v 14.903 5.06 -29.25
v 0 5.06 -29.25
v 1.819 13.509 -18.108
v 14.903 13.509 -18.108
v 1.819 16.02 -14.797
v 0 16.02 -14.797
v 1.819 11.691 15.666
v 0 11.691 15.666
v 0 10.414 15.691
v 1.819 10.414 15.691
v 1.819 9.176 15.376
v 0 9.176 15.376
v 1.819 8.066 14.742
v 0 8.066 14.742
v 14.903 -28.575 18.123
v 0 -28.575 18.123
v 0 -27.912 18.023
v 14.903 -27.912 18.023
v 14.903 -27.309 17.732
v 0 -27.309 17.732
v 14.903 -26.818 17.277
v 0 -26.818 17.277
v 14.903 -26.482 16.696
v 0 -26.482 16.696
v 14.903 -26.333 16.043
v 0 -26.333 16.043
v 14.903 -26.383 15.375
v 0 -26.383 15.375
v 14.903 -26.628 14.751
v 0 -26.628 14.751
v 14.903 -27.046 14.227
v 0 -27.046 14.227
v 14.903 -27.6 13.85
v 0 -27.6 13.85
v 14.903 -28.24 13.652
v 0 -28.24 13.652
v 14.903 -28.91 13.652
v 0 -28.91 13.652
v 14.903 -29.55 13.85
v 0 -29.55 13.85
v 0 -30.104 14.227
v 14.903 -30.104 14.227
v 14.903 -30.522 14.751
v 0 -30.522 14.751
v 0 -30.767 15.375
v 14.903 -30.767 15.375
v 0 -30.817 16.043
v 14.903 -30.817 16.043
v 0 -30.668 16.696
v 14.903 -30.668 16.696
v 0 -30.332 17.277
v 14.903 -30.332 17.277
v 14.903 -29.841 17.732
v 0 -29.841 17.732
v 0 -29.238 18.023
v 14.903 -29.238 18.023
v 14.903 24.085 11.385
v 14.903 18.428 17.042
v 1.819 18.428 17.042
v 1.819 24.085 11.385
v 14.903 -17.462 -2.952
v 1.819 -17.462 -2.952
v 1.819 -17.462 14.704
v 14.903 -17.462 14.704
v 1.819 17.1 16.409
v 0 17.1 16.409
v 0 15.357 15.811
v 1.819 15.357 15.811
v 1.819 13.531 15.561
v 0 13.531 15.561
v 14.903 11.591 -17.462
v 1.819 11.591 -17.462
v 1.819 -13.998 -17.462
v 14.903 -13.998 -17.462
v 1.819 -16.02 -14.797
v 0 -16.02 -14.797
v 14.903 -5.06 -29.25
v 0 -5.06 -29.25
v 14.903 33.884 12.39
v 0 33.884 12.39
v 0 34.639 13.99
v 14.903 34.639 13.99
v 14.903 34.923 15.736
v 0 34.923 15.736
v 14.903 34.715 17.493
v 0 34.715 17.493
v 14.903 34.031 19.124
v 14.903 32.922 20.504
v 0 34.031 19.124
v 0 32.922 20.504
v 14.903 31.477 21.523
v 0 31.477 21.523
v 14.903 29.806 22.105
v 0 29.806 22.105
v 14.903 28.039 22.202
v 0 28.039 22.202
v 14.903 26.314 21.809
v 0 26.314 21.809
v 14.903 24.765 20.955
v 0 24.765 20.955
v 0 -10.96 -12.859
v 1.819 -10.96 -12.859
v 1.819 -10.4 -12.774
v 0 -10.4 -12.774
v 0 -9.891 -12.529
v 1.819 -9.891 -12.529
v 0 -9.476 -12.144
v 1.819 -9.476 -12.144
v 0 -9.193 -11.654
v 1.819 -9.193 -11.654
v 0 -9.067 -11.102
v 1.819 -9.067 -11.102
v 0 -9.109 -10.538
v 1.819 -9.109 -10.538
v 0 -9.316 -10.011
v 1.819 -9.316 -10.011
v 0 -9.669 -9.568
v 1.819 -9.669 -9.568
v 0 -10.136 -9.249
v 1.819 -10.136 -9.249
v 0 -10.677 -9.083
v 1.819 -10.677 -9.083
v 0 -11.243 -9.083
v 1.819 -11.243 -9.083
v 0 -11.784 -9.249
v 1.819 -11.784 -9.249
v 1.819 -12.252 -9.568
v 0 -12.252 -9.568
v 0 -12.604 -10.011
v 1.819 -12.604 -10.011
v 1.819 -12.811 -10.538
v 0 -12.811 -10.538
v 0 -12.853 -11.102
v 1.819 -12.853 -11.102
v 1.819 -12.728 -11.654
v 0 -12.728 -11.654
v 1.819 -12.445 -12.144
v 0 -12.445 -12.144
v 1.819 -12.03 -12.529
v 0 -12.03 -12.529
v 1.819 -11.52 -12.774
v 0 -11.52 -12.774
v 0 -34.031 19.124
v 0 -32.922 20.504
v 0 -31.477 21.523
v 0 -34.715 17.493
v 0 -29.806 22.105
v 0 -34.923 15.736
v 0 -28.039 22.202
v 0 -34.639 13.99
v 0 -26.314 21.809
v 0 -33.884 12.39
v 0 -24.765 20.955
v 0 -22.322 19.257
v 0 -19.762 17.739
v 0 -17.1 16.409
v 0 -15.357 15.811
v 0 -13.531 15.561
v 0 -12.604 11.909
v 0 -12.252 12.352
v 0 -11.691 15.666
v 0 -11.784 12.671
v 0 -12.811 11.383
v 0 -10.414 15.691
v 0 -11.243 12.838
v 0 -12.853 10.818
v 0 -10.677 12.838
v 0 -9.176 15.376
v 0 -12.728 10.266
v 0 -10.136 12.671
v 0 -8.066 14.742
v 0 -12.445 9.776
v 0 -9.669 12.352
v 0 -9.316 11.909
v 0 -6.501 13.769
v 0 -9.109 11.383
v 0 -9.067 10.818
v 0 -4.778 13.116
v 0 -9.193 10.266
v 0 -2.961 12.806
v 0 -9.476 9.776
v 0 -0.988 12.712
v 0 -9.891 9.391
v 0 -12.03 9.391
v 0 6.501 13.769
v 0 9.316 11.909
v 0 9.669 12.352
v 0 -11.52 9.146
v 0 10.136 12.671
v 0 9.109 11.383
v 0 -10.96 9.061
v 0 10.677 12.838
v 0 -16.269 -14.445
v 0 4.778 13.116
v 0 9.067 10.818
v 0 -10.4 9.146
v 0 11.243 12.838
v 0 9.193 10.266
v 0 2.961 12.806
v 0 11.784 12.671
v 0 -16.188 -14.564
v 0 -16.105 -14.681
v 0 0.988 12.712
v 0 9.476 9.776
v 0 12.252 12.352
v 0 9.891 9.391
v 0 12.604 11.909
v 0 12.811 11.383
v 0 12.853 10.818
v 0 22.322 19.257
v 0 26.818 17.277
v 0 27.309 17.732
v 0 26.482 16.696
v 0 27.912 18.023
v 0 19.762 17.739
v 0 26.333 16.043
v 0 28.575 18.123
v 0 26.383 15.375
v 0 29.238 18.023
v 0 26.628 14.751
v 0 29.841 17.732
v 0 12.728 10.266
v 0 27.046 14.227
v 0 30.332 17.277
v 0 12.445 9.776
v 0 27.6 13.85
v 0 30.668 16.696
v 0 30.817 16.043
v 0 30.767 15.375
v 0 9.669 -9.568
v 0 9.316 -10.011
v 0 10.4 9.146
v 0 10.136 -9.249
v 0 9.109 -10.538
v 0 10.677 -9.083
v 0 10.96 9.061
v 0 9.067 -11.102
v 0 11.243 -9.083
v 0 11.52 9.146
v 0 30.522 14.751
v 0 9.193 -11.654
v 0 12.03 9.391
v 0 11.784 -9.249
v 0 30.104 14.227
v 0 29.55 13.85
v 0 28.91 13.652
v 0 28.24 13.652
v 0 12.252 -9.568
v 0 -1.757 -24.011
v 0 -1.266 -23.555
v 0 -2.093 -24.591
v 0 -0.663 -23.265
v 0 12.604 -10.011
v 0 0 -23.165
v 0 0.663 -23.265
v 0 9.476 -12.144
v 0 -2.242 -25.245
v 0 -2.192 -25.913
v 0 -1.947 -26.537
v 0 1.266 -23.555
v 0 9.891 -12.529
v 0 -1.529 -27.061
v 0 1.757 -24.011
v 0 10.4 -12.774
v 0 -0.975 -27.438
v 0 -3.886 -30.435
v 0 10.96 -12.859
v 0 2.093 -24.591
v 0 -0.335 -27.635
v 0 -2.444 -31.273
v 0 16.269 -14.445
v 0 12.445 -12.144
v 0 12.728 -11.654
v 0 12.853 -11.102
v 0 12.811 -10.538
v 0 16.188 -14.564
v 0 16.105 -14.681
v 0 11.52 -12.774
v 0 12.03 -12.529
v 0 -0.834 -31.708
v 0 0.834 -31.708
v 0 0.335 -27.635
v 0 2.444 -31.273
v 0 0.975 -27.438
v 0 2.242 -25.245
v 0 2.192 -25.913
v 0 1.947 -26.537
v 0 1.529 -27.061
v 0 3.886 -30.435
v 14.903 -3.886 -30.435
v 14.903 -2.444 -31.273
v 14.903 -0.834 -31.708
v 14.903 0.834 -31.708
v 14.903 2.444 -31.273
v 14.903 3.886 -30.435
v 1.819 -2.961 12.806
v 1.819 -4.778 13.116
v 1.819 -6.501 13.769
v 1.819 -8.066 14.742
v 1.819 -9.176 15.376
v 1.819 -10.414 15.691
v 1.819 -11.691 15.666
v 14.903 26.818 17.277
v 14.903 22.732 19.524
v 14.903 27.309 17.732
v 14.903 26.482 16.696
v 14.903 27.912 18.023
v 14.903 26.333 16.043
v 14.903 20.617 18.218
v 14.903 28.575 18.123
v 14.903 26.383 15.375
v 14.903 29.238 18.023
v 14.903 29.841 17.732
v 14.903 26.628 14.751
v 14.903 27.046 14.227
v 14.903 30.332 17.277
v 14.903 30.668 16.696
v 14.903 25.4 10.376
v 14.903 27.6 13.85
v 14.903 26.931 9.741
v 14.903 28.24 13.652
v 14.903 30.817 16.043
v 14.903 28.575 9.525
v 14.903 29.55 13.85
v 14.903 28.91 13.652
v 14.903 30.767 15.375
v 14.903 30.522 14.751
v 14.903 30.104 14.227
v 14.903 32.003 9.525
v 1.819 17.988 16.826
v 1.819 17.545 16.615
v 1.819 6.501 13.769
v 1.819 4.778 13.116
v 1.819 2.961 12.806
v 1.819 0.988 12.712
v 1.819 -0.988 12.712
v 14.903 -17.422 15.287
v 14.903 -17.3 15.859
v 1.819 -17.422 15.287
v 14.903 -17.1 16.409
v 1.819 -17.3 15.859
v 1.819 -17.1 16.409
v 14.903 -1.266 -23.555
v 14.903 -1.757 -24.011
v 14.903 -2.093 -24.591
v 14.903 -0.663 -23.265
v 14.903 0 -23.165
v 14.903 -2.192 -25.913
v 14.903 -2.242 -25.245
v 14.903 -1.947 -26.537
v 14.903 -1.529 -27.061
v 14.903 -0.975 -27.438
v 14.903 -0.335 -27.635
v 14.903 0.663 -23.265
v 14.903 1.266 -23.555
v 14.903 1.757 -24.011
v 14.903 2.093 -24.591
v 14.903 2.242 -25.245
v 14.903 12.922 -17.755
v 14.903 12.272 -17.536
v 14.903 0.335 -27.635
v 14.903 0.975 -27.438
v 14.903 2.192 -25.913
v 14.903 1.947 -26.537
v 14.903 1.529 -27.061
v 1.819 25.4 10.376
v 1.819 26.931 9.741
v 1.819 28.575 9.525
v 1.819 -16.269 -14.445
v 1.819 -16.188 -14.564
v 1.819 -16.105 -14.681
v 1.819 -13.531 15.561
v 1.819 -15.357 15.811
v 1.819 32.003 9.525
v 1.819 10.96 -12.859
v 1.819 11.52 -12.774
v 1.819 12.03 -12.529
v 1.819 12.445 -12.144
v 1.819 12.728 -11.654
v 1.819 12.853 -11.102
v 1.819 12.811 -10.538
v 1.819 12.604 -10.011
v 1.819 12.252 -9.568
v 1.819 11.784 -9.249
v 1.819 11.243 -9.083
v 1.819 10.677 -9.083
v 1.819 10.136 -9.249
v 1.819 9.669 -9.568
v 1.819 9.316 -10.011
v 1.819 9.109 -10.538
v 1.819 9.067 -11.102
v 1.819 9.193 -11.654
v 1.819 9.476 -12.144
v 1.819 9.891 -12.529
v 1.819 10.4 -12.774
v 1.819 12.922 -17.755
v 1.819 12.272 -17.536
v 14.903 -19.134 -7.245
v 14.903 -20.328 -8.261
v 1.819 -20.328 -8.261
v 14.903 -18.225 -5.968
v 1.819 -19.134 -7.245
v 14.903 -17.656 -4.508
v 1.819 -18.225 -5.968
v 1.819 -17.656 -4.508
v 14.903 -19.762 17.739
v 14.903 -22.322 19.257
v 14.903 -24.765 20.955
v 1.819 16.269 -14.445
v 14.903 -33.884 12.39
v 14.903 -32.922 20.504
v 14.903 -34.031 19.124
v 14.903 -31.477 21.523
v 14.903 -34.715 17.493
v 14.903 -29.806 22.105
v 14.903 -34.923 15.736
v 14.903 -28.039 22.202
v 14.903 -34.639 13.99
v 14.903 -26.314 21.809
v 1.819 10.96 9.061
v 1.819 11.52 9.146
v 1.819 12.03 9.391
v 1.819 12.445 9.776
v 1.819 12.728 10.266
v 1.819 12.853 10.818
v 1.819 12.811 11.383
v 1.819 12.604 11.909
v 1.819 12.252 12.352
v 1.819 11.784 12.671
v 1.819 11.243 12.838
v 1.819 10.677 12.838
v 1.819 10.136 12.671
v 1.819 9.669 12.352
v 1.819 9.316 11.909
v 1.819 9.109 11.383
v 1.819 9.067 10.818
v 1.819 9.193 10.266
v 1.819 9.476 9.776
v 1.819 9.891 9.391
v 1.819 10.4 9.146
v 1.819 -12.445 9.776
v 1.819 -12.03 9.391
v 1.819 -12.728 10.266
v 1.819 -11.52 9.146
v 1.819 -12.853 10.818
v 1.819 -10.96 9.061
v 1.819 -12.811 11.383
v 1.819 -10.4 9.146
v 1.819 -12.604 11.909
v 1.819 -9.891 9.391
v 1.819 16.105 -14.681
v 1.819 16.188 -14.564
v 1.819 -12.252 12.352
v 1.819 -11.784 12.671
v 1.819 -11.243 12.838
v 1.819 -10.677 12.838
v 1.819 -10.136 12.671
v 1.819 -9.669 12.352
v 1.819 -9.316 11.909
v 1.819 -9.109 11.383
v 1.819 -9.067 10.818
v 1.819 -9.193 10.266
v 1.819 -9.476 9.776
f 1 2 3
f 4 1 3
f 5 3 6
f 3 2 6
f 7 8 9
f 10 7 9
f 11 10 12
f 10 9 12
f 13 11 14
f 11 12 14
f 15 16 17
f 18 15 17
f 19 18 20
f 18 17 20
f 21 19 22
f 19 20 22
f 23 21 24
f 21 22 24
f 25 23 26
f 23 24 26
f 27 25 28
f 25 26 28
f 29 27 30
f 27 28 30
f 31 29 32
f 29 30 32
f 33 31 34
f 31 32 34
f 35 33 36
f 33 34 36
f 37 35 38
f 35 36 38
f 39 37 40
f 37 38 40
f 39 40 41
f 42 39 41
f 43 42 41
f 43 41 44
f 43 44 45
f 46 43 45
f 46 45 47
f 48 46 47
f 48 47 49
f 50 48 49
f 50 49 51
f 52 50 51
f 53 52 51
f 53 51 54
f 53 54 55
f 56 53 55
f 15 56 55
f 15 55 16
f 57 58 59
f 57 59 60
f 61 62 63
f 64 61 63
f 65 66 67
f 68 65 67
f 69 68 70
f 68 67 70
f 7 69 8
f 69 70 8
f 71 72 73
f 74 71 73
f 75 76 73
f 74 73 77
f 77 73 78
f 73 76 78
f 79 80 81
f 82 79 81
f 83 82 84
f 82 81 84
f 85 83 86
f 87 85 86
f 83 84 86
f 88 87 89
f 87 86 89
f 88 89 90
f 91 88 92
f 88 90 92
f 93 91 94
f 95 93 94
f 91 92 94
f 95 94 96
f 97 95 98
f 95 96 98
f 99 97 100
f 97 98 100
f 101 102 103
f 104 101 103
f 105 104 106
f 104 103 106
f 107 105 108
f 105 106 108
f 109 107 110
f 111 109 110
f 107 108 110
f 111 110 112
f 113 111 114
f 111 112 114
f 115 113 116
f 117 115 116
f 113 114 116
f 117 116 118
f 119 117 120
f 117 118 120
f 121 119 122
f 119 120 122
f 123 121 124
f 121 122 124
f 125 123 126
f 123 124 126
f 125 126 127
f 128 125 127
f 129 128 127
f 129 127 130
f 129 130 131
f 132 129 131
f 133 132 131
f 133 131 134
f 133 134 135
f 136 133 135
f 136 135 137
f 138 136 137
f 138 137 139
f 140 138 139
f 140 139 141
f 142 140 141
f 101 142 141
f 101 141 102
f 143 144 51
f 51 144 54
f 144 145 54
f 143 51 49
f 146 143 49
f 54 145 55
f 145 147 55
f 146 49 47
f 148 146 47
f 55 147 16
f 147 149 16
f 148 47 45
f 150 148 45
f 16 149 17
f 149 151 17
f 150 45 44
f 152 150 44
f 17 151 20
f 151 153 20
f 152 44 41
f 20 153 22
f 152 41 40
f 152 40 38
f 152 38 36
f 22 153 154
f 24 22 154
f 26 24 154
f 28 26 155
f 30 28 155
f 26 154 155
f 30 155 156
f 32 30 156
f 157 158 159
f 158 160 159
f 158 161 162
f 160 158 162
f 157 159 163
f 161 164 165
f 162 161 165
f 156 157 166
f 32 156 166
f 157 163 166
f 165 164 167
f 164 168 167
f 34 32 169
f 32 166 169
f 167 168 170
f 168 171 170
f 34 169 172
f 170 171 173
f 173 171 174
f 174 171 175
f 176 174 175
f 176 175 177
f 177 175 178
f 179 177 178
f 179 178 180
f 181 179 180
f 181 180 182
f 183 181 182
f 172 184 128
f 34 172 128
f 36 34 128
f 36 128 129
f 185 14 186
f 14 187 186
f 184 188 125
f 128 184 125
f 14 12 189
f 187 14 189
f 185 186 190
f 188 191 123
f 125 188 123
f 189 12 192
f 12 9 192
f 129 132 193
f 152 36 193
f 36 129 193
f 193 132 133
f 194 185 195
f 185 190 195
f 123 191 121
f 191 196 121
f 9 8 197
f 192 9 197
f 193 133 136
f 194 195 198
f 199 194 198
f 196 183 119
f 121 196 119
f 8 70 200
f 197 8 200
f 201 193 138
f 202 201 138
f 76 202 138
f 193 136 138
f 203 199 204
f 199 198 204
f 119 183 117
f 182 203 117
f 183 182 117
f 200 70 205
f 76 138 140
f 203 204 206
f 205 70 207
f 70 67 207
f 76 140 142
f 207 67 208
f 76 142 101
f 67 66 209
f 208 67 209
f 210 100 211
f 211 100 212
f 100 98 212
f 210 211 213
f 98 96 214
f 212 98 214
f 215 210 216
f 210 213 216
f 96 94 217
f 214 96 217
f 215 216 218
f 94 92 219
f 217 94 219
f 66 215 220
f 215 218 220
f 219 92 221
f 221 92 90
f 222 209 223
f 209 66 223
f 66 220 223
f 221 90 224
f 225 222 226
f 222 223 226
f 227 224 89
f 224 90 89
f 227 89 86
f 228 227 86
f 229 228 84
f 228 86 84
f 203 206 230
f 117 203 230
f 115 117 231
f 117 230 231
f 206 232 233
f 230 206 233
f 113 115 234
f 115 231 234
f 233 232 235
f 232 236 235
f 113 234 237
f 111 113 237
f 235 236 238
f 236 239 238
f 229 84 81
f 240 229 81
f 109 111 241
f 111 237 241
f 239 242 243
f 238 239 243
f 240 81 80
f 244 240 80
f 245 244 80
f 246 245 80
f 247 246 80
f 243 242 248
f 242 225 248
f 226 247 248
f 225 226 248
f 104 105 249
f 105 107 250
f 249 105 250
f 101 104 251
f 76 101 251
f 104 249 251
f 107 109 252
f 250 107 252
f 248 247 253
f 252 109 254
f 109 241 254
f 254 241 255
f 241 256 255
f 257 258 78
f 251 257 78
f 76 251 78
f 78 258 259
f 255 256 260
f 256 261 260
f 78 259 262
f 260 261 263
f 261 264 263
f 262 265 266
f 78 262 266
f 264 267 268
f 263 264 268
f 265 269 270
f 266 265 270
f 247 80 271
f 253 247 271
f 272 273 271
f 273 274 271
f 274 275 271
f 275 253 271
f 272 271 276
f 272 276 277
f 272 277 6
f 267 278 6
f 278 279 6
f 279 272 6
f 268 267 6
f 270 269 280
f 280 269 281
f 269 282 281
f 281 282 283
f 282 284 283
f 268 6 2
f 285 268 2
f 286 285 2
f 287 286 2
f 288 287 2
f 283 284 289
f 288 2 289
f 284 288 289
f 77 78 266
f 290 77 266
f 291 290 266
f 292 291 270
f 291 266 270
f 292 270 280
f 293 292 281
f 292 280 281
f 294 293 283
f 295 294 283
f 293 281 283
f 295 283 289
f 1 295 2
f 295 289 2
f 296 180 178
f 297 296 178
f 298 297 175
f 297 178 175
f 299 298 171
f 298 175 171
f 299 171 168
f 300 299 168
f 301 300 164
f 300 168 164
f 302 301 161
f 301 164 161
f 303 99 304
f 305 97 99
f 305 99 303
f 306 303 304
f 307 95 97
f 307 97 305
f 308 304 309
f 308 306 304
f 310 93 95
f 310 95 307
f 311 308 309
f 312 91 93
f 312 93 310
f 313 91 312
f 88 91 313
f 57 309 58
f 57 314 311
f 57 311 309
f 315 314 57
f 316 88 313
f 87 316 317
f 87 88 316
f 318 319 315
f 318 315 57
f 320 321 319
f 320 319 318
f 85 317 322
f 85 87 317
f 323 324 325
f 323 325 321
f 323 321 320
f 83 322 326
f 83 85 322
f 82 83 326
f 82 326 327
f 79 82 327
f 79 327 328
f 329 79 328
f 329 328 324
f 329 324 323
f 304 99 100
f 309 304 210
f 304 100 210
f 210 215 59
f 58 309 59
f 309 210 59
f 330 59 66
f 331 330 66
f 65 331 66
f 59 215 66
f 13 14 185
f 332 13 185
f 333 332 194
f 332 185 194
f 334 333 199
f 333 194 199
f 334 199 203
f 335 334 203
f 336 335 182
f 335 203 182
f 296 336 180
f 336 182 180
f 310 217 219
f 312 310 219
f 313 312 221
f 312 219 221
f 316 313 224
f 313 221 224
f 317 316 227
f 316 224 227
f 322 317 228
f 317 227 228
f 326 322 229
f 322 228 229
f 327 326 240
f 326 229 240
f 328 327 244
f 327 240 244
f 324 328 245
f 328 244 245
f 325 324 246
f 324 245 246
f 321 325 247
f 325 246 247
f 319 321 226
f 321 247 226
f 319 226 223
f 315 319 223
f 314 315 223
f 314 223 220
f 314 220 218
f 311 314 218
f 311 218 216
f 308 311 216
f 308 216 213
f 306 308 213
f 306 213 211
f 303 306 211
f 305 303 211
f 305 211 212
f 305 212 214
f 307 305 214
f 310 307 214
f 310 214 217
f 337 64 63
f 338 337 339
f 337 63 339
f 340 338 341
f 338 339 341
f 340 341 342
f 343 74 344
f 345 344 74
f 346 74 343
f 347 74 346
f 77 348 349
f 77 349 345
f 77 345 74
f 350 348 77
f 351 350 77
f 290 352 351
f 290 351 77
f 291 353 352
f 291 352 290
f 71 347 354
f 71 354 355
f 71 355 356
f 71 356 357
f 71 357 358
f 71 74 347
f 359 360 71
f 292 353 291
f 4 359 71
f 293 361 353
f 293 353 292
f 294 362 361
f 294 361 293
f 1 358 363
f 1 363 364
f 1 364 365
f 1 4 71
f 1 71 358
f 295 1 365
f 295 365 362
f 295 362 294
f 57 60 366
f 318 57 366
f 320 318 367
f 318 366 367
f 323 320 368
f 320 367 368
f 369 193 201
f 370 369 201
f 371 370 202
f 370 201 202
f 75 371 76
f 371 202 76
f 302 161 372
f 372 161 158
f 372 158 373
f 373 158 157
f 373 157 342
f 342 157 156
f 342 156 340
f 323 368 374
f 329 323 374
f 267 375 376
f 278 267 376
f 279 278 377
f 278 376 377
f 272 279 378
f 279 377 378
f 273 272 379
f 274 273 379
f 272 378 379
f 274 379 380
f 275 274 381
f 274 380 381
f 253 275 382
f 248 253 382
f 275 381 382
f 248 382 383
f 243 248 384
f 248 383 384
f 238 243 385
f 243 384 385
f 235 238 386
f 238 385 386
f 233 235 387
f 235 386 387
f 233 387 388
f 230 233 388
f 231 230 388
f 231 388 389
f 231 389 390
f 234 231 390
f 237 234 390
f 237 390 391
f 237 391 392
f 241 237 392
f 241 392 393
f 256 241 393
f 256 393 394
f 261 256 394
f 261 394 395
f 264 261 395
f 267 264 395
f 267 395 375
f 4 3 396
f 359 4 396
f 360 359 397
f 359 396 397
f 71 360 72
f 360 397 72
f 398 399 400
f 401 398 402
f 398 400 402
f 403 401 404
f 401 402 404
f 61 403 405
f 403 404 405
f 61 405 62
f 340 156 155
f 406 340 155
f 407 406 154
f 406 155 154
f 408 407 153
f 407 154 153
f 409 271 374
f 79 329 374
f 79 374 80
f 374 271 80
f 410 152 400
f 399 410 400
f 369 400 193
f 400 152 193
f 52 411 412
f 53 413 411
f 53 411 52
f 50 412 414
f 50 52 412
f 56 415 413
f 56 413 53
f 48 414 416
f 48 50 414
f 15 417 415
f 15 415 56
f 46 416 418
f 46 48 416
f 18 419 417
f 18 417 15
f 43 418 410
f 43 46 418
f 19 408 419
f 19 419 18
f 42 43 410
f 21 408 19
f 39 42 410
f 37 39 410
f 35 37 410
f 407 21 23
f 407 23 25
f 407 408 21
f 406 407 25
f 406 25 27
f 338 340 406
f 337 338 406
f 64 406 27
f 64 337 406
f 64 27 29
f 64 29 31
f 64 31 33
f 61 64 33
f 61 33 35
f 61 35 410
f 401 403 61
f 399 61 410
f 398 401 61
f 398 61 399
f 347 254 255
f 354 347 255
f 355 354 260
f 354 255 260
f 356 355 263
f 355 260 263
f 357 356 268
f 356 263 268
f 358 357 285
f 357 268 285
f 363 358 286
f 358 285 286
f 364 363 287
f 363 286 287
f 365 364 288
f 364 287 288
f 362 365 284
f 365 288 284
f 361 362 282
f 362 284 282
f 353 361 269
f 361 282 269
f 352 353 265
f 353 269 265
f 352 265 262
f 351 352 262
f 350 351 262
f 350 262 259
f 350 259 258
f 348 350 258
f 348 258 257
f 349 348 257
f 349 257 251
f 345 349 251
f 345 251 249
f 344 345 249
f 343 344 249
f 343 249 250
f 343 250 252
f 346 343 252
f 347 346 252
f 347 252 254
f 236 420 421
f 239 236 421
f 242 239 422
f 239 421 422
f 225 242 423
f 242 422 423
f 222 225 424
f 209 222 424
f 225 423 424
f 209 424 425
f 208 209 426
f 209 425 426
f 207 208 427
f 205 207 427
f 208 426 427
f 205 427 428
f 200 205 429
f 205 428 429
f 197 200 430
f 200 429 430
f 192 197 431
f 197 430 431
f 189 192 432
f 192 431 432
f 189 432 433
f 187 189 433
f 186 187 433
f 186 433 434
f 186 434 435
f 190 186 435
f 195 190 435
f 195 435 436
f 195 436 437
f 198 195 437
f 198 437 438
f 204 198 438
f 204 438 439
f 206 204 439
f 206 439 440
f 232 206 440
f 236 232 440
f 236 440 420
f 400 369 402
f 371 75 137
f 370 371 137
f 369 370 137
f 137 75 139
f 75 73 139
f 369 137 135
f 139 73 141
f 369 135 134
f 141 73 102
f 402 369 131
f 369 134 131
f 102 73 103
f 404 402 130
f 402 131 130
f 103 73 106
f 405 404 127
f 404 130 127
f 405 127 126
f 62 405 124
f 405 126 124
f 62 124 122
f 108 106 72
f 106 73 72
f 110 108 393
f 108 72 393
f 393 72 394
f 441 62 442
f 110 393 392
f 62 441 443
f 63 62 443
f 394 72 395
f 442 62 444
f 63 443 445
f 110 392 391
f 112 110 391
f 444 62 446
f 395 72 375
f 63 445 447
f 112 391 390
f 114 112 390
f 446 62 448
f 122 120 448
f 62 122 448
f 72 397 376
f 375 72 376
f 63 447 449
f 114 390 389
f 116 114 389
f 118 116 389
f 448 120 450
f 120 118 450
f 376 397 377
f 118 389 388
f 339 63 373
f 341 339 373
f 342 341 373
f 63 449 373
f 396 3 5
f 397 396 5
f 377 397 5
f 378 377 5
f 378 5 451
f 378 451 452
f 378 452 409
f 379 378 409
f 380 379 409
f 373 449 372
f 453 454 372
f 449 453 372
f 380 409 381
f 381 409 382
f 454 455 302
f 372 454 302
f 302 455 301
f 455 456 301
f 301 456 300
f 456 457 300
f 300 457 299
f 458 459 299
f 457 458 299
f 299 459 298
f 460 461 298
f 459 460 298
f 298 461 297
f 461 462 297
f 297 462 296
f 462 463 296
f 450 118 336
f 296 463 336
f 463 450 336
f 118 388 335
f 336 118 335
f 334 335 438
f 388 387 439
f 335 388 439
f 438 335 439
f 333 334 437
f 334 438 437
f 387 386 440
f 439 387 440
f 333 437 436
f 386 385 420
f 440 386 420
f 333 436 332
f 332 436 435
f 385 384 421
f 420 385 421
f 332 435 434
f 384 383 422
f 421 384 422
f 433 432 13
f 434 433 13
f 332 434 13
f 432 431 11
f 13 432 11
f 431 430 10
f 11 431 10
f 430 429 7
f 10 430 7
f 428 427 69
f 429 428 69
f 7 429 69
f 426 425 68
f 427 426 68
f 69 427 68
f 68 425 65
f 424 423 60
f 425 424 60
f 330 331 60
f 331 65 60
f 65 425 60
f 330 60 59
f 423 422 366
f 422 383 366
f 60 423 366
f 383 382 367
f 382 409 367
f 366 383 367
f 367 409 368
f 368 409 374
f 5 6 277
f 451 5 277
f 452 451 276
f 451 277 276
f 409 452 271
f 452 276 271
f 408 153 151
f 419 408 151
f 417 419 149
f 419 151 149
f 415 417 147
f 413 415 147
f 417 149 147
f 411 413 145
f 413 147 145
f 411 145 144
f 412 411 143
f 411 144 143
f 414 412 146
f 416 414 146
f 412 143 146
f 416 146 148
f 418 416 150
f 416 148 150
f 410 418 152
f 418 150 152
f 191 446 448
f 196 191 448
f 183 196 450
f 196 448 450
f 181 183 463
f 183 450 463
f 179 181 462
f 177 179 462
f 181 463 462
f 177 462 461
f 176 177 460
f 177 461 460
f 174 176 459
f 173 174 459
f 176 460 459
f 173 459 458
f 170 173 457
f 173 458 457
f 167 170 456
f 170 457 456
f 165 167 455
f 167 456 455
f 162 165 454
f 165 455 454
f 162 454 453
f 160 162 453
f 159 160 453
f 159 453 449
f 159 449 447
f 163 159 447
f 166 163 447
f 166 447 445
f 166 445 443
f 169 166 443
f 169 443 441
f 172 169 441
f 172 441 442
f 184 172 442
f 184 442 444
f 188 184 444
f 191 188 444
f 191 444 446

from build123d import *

# Parameters (mm, degrees)
BOSS_EXTRUDE1_DEPTH   = 14.90345
F_8_CLEARANCE_HOLE1_D = 4.4958
CUT_EXTRUDE1_START    = -13.084175
CUT_EXTRUDE1_DEPTH    = 13.084175
F_6_CLEARANCE_HOLE1_D = 3.7973


with BuildPart() as part:
    # Sketch1 → Boss-Extrude1 (new body)
    with BuildSketch(Plane(origin=(0, 0, 0), x_dir=(0, 0, -1), z_dir=(1, 0, 0))):
        with BuildLine():
            Line((-12.390427979, -33.883508061), (14.444672021, -16.268608061))
            ThreePointArc((14.444672021, -16.268608061), (14.622989145, -16.14717462), (14.797078303, -16.019753892))
            Line((14.797078303, -16.019753892), (29.249678303, -5.059653892))
            ThreePointArc((29.249678303, -5.059653892), (31.7627, 0), (29.249678303, 5.059653892))
            Line((29.249678303, 5.059653892), (14.797078303, 16.019753892))
            ThreePointArc((14.797078303, 16.019753892), (14.622989145, 16.14717462), (14.444672021, 16.268608061))
            Line((14.444672021, 16.268608061), (-12.390427979, 33.883508061))
            ThreePointArc((-12.390427979, 33.883508061), (-20.503514332, 32.92233885), (-20.955, 24.765))
            ThreePointArc((-20.955, 24.765), (-18.474577219, 21.05577373), (-16.409060049, 17.100461415))
            ThreePointArc((-16.409060049, 17.100461415), (-15.641722595, 14.450337743), (-15.666107705, 11.691467029))
            ThreePointArc((-15.666107705, 11.691467029), (-15.575146808, 9.784196429), (-14.742333624, 8.065948127))
            ThreePointArc((-14.742333624, 8.065948127), (-13.400723388, 5.655129962), (-12.806341132, 2.960937694))
            ThreePointArc((-12.806341132, 2.960937694), (-12.7, 0), (-12.806341132, -2.960937694))
            ThreePointArc((-12.806341132, -2.960937694), (-13.400723388, -5.655129962), (-14.742333624, -8.065948127))
            ThreePointArc((-14.742333624, -8.065948127), (-15.575146808, -9.784196429), (-15.666107705, -11.691467029))
            ThreePointArc((-15.666107705, -11.691467029), (-15.641722595, -14.450337743), (-16.409060049, -17.100461415))
            ThreePointArc((-16.409060049, -17.100461415), (-18.474577219, -21.05577373), (-20.955, -24.765))
            ThreePointArc((-20.955, -24.765), (-20.503514332, -32.92233885), (-12.390427979, -33.883508061))
        make_face()
    extrude(amount=BOSS_EXTRUDE1_DEPTH)

    # #8 Clearance Hole1 (through all)
    with Locations(Plane(origin=(14.90345, 0, 0), x_dir=(0, 0, -1), z_dir=(1, 0, 0))):
        with Locations((-15.875, -28.575), (-15.875, 28.575), (25.4127, 0)):
            Hole(F_8_CLEARANCE_HOLE1_D / 2)

    # Sketch4 → Cut-Extrude1 (cut)
    with BuildSketch(Plane(origin=(14.90345, 0, 0), x_dir=(0, 0, -1), z_dir=(1, 0, 0)).offset(CUT_EXTRUDE1_START)):
        with BuildLine():
            Line((2.952066637, -17.4625), (-14.703535363, -17.4625))
            ThreePointArc((-14.703535363, -17.4625), (-17.670883965, -16.233383965), (-18.9, -13.266035363))
            Line((-18.9, -13.266035363), (-18.9, 16.569743879))
            Line((-18.9, 16.569743879), (-11.384871939, 24.084871939))
            ThreePointArc((-11.384871939, 24.084871939), (-10.008364969, 26.144960204), (-9.525, 28.575))
            Line((-9.525, 28.575), (-9.525, 39.085699772))
            Line((-9.525, 39.085699772), (17.4625, 39.085699772))
            Line((17.4625, 39.085699772), (17.4625, 20.906374998))
            Line((17.4625, 20.906374998), (22.410286301, 14.224662488))
            ThreePointArc((22.410286301, 14.224662488), (19.145516673, 14.39328975), (17.4625, 11.590681902))
            Line((17.4625, 11.590681902), (17.4625, -17.4625))
            Line((17.4625, -17.4625), (7.616513377, -28.12126277))
            ThreePointArc((7.616513377, -28.12126277), (8.769417563, -21.266733278), (2.952066637, -17.4625))
        make_face()
    extrude(amount=CUT_EXTRUDE1_DEPTH, mode=Mode.SUBTRACT)

    # #6 Clearance Hole1 (through all)
    with Locations(Plane.ZY):
        with Locations((10.9601, -10.9601), (-10.9601, -10.9601), (-10.9601, 10.9601), (10.9601, 10.9601)):
            Hole(F_6_CLEARANCE_HOLE1_D / 2)


solid = part.part
